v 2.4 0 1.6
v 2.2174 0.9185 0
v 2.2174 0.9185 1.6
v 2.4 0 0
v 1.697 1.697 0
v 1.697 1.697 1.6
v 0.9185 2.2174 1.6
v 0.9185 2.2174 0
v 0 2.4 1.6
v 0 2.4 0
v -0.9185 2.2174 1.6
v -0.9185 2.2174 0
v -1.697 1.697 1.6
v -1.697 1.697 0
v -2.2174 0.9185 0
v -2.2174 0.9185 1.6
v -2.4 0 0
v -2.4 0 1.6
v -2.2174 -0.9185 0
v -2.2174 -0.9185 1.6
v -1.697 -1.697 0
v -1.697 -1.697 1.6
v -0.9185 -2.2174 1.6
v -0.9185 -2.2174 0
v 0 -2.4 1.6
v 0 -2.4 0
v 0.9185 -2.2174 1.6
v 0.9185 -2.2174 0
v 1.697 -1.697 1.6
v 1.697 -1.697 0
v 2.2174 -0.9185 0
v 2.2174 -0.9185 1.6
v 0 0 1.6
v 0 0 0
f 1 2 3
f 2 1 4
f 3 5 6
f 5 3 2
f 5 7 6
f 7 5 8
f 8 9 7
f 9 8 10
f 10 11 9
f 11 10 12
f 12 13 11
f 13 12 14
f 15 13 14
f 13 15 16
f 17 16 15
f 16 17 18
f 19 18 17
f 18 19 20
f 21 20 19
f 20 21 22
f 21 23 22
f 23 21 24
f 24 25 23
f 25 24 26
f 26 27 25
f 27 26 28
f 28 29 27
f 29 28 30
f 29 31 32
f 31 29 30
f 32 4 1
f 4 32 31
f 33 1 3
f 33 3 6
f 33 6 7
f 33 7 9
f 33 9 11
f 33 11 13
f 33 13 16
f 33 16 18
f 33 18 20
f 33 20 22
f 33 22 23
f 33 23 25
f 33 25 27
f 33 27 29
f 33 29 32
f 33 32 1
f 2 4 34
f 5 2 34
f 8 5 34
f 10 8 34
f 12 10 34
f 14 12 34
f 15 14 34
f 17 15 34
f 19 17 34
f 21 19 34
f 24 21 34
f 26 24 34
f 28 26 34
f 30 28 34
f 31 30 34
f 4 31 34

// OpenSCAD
// file: 4-4edge.scad
use <../lib.scad>
function ldraw_lib__4_4edge() = [
// 0 Circle 1.0
// 0 Name: 4-4edge.dat
// 0 Author: James Jessiman
// 0 !LDRAW_ORG Primitive UPDATE 2017-01
// 0 !LICENSE Licensed under CC BY 4.0 : see CAreadme.txt
// 
// 0 BFC CERTIFY CCW
  [0,"BFC","CERTIFY"],
  [0,"BFC","CCW"],
// 
// 0 !HISTORY 1998-12-15 [PTadmin] Official Update 1998-10
// 0 !HISTORY 2005-12-28 [PTadmin] Official Update 2005-01
// 0 !HISTORY 2007-06-24 [PTadmin] Header formatted for Contributor Agreement
// 0 !HISTORY 2008-07-01 [PTadmin] Official Update 2008-01
// 0 !HISTORY 2017-01-15 [Steffen] BFCed
// 0 !HISTORY 2017-12-30 [PTadmin] Official Update 2017-01
// 
// 
// 2 24 1 0 0 0.9239 0 0.3827
  [2,24,1,0,0,0.9239,0,0.3827],
// 2 24 0.9239 0 0.3827 0.7071 0 0.7071
  [2,24,0.9239,0,0.3827,0.7071,0,0.7071],
// 2 24 0.7071 0 0.7071 0.3827 0 0.9239
  [2,24,0.7071,0,0.7071,0.3827,0,0.9239],
// 2 24 0.3827 0 0.9239 0 0 1
  [2,24,0.3827,0,0.9239,0,0,1],
// 2 24 0 0 1 -0.3827 0 0.9239
  [2,24,0,0,1,-0.3827,0,0.9239],
// 2 24 -0.3827 0 0.9239 -0.7071 0 0.7071
  [2,24,-0.3827,0,0.9239,-0.7071,0,0.7071],
// 2 24 -0.7071 0 0.7071 -0.9239 0 0.3827
  [2,24,-0.7071,0,0.7071,-0.9239,0,0.3827],
// 2 24 -0.9239 0 0.3827 -1 0 -0
  [2,24,-0.9239,0,0.3827,-1,0,-0],
// 2 24 -1 0 -0 -0.9239 0 -0.3827
  [2,24,-1,0,-0,-0.9239,0,-0.3827],
// 2 24 -0.9239 0 -0.3827 -0.7071 0 -0.7071
  [2,24,-0.9239,0,-0.3827,-0.7071,0,-0.7071],
// 2 24 -0.7071 0 -0.7071 -0.3827 0 -0.9239
  [2,24,-0.7071,0,-0.7071,-0.3827,0,-0.9239],
// 2 24 -0.3827 0 -0.9239 0 0 -1
  [2,24,-0.3827,0,-0.9239,0,0,-1],
// 2 24 0 0 -1 0.3827 0 -0.9239
  [2,24,0,0,-1,0.3827,0,-0.9239],
// 2 24 0.3827 0 -0.9239 0.7071 0 -0.7071
  [2,24,0.3827,0,-0.9239,0.7071,0,-0.7071],
// 2 24 0.7071 0 -0.7071 0.9239 0 -0.3827
  [2,24,0.7071,0,-0.7071,0.9239,0,-0.3827],
// 2 24 0.9239 0 -0.3827 1 0 0
  [2,24,0.9239,0,-0.3827,1,0,0],
];
module ldraw_lib__4_4edge(step=0, col=false, unit=2/5, alt=false, line=0.2, solid=!$preview)
    makepoly(ldraw_lib__4_4edge(), step=step, col=col, unit=unit, alt=alt, line=line, solid=solid);
ldraw_lib__4_4edge(line=0.2);
// file: 4-4disc.scad
use <../lib.scad>
function ldraw_lib__4_4disc() = [
// 0 Disc 1.0
// 0 Name: 4-4disc.dat
// 0 Author: James Jessiman
// 0 !LDRAW_ORG Primitive UPDATE 2002-02
// 0 !LICENSE Licensed under CC BY 4.0 : see CAreadme.txt
// 
// 0 BFC CERTIFY CCW
  [0,"BFC","CERTIFY"],
  [0,"BFC","CCW"],
// 
// 0 !HISTORY 1998-12-15 [PTadmin] Official Update 1998-10
// 0 !HISTORY 2002-03-23 [sbliss] Added BFC statement
// 0 !HISTORY 2002-04-25 [PTadmin] Official Update 2002-02
// 0 !HISTORY 2007-06-24 [PTadmin] Header formatted for Contributor Agreement
// 0 !HISTORY 2008-07-01 [PTadmin] Official Update 2008-01
// 
// 
// 3 16 0 0 0 1 0 0 0.9239 0 0.3827
  [3,16,0,0,0,1,0,0,0.9239,0,0.3827],
// 3 16 0 0 0 0.9239 0 0.3827 0.7071 0 0.7071
  [3,16,0,0,0,0.9239,0,0.3827,0.7071,0,0.7071],
// 3 16 0 0 0 0.7071 0 0.7071 0.3827 0 0.9239
  [3,16,0,0,0,0.7071,0,0.7071,0.3827,0,0.9239],
// 3 16 0 0 0 0.3827 0 0.9239 0 0 1
  [3,16,0,0,0,0.3827,0,0.9239,0,0,1],
// 3 16 0 0 0 0 0 1 -0.3827 0 0.9239
  [3,16,0,0,0,0,0,1,-0.3827,0,0.9239],
// 3 16 0 0 0 -0.3827 0 0.9239 -0.7071 0 0.7071
  [3,16,0,0,0,-0.3827,0,0.9239,-0.7071,0,0.7071],
// 3 16 0 0 0 -0.7071 0 0.7071 -0.9239 0 0.3827
  [3,16,0,0,0,-0.7071,0,0.7071,-0.9239,0,0.3827],
// 3 16 0 0 0 -0.9239 0 0.3827 -1 0 -0
  [3,16,0,0,0,-0.9239,0,0.3827,-1,0,-0],
// 3 16 0 0 0 -1 0 -0 -0.9239 0 -0.3827
  [3,16,0,0,0,-1,0,-0,-0.9239,0,-0.3827],
// 3 16 0 0 0 -0.9239 0 -0.3827 -0.7071 0 -0.7071
  [3,16,0,0,0,-0.9239,0,-0.3827,-0.7071,0,-0.7071],
// 3 16 0 0 0 -0.7071 0 -0.7071 -0.3827 0 -0.9239
  [3,16,0,0,0,-0.7071,0,-0.7071,-0.3827,0,-0.9239],
// 3 16 0 0 0 -0.3827 0 -0.9239 0 0 -1
  [3,16,0,0,0,-0.3827,0,-0.9239,0,0,-1],
// 3 16 0 0 0 0 0 -1 0.3827 0 -0.9239
  [3,16,0,0,0,0,0,-1,0.3827,0,-0.9239],
// 3 16 0 0 0 0.3827 0 -0.9239 0.7071 0 -0.7071
  [3,16,0,0,0,0.3827,0,-0.9239,0.7071,0,-0.7071],
// 3 16 0 0 0 0.7071 0 -0.7071 0.9239 0 -0.3827
  [3,16,0,0,0,0.7071,0,-0.7071,0.9239,0,-0.3827],
// 3 16 0 0 0 0.9239 0 -0.3827 1 0 0
  [3,16,0,0,0,0.9239,0,-0.3827,1,0,0],
// 0
];
module ldraw_lib__4_4disc(step=0, col=false, unit=2/5, alt=false, line=0.2, solid=!$preview)
    makepoly(ldraw_lib__4_4disc(), step=step, col=col, unit=unit, alt=alt, line=line, solid=solid);
ldraw_lib__4_4disc(line=0.2);
// file: 4-4cyli.scad
use <../lib.scad>
function ldraw_lib__4_4cyli() = [
// 0 Cylinder 1.0
// 0 Name: 4-4cyli.dat
// 0 Author: James Jessiman
// 0 !LDRAW_ORG Primitive UPDATE 2005-01
// 0 !LICENSE Licensed under CC BY 4.0 : see CAreadme.txt
// 
// 0 BFC CERTIFY CCW
  [0,"BFC","CERTIFY"],
  [0,"BFC","CCW"],
// 
// 0 !HISTORY 1998-12-15 [PTadmin] Official Update 1998-10
// 0 !HISTORY 2002-03-23 [sbliss] Added BFC statement; merged headers from files in distributions LDraw 0.27 and Complete.
// 0 !HISTORY 2002-04-25 [PTadmin] Official Update 2002-02
// 0 !HISTORY 2004-12-14 [guyvivan] BFC CCW
// 0 !HISTORY 2005-12-28 [PTadmin] Official Update 2005-01
// 0 !HISTORY 2007-06-24 [PTadmin] Header formatted for Contributor Agreement
// 0 !HISTORY 2008-07-01 [PTadmin] Official Update 2008-01
// 
// 
// 4 16 1 1 0 0.9239 1 0.3827 0.9239 0 0.3827 1 0 0
  [4,16,1,1,0,0.9239,1,0.3827,0.9239,0,0.3827,1,0,0],
// 5 24 1 0 0 1 1 0 0.9239 0 0.3827 0.9239 0 -0.3827
  [5,24,1,0,0,1,1,0,0.9239,0,0.3827,0.9239,0,-0.3827],
// 4 16 0.9239 1 0.3827 0.7071 1 0.7071 0.7071 0 0.7071 0.9239 0 0.3827
  [4,16,0.9239,1,0.3827,0.7071,1,0.7071,0.7071,0,0.7071,0.9239,0,0.3827],
// 5 24 0.9239 0 0.3827 0.9239 1 0.3827 0.7071 0 0.7071 1 0 0
  [5,24,0.9239,0,0.3827,0.9239,1,0.3827,0.7071,0,0.7071,1,0,0],
// 4 16 0.7071 1 0.7071 0.3827 1 0.9239 0.3827 0 0.9239 0.7071 0 0.7071
  [4,16,0.7071,1,0.7071,0.3827,1,0.9239,0.3827,0,0.9239,0.7071,0,0.7071],
// 5 24 0.7071 0 0.7071 0.7071 1 0.7071 0.3827 0 0.9239 0.9239 0 0.3827
  [5,24,0.7071,0,0.7071,0.7071,1,0.7071,0.3827,0,0.9239,0.9239,0,0.3827],
// 4 16 0.3827 1 0.9239 0 1 1 0 0 1 0.3827 0 0.9239
  [4,16,0.3827,1,0.9239,0,1,1,0,0,1,0.3827,0,0.9239],
// 5 24 0.3827 0 0.9239 0.3827 1 0.9239 0 0 1 0.7071 0 0.7071
  [5,24,0.3827,0,0.9239,0.3827,1,0.9239,0,0,1,0.7071,0,0.7071],
// 4 16 0 1 1 -0.3827 1 0.9239 -0.3827 0 0.9239 0 0 1
  [4,16,0,1,1,-0.3827,1,0.9239,-0.3827,0,0.9239,0,0,1],
// 5 24 0 0 1 0 1 1 -0.3827 0 0.9239 0.3827 0 0.9239
  [5,24,0,0,1,0,1,1,-0.3827,0,0.9239,0.3827,0,0.9239],
// 4 16 -0.3827 1 0.9239 -0.7071 1 0.7071 -0.7071 0 0.7071 -0.3827 0 0.9239
  [4,16,-0.3827,1,0.9239,-0.7071,1,0.7071,-0.7071,0,0.7071,-0.3827,0,0.9239],
// 5 24 -0.3827 0 0.9239 -0.3827 1 0.9239 -0.7071 0 0.7071 0 0 1
  [5,24,-0.3827,0,0.9239,-0.3827,1,0.9239,-0.7071,0,0.7071,0,0,1],
// 4 16 -0.7071 1 0.7071 -0.9239 1 0.3827 -0.9239 0 0.3827 -0.7071 0 0.7071
  [4,16,-0.7071,1,0.7071,-0.9239,1,0.3827,-0.9239,0,0.3827,-0.7071,0,0.7071],
// 5 24 -0.7071 0 0.7071 -0.7071 1 0.7071 -0.9239 0 0.3827 -0.3827 0 0.9239
  [5,24,-0.7071,0,0.7071,-0.7071,1,0.7071,-0.9239,0,0.3827,-0.3827,0,0.9239],
// 4 16 -0.9239 1 0.3827 -1 1 0 -1 0 0 -0.9239 0 0.3827
  [4,16,-0.9239,1,0.3827,-1,1,0,-1,0,0,-0.9239,0,0.3827],
// 5 24 -0.9239 0 0.3827 -0.9239 1 0.3827 -1 0 0 -0.7071 0 0.7071
  [5,24,-0.9239,0,0.3827,-0.9239,1,0.3827,-1,0,0,-0.7071,0,0.7071],
// 4 16 -1 1 0 -0.9239 1 -0.3827 -0.9239 0 -0.3827 -1 0 0
  [4,16,-1,1,0,-0.9239,1,-0.3827,-0.9239,0,-0.3827,-1,0,0],
// 5 24 -1 0 0 -1 1 0 -0.9239 0 -0.3827 -0.9239 0 0.3827
  [5,24,-1,0,0,-1,1,0,-0.9239,0,-0.3827,-0.9239,0,0.3827],
// 4 16 -0.9239 1 -0.3827 -0.7071 1 -0.7071 -0.7071 0 -0.7071 -0.9239 0 -0.3827
  [4,16,-0.9239,1,-0.3827,-0.7071,1,-0.7071,-0.7071,0,-0.7071,-0.9239,0,-0.3827],
// 5 24 -0.9239 0 -0.3827 -0.9239 1 -0.3827 -0.7071 0 -0.7071 -1 0 0
  [5,24,-0.9239,0,-0.3827,-0.9239,1,-0.3827,-0.7071,0,-0.7071,-1,0,0],
// 4 16 -0.7071 1 -0.7071 -0.3827 1 -0.9239 -0.3827 0 -0.9239 -0.7071 0 -0.7071
  [4,16,-0.7071,1,-0.7071,-0.3827,1,-0.9239,-0.3827,0,-0.9239,-0.7071,0,-0.7071],
// 5 24 -0.7071 0 -0.7071 -0.7071 1 -0.7071 -0.3827 0 -0.9239 -0.9239 0 -0.3827
  [5,24,-0.7071,0,-0.7071,-0.7071,1,-0.7071,-0.3827,0,-0.9239,-0.9239,0,-0.3827],
// 4 16 -0.3827 1 -0.9239 0 1 -1 0 0 -1 -0.3827 0 -0.9239
  [4,16,-0.3827,1,-0.9239,0,1,-1,0,0,-1,-0.3827,0,-0.9239],
// 5 24 -0.3827 0 -0.9239 -0.3827 1 -0.9239 0 0 -1 -0.7071 0 -0.7071
  [5,24,-0.3827,0,-0.9239,-0.3827,1,-0.9239,0,0,-1,-0.7071,0,-0.7071],
// 4 16 0 1 -1 0.3827 1 -0.9239 0.3827 0 -0.9239 0 0 -1
  [4,16,0,1,-1,0.3827,1,-0.9239,0.3827,0,-0.9239,0,0,-1],
// 5 24 0 0 -1 0 1 -1 0.3827 0 -0.9239 -0.3827 0 -0.9239
  [5,24,0,0,-1,0,1,-1,0.3827,0,-0.9239,-0.3827,0,-0.9239],
// 4 16 0.3827 1 -0.9239 0.7071 1 -0.7071 0.7071 0 -0.7071 0.3827 0 -0.9239
  [4,16,0.3827,1,-0.9239,0.7071,1,-0.7071,0.7071,0,-0.7071,0.3827,0,-0.9239],
// 5 24 0.3827 0 -0.9239 0.3827 1 -0.9239 0.7071 0 -0.7071 0 0 -1
  [5,24,0.3827,0,-0.9239,0.3827,1,-0.9239,0.7071,0,-0.7071,0,0,-1],
// 4 16 0.7071 1 -0.7071 0.9239 1 -0.3827 0.9239 0 -0.3827 0.7071 0 -0.7071
  [4,16,0.7071,1,-0.7071,0.9239,1,-0.3827,0.9239,0,-0.3827,0.7071,0,-0.7071],
// 5 24 0.7071 0 -0.7071 0.7071 1 -0.7071 0.9239 0 -0.3827 0.3827 0 -0.9239
  [5,24,0.7071,0,-0.7071,0.7071,1,-0.7071,0.9239,0,-0.3827,0.3827,0,-0.9239],
// 4 16 0.9239 1 -0.3827 1 1 0 1 0 0 0.9239 0 -0.3827
  [4,16,0.9239,1,-0.3827,1,1,0,1,0,0,0.9239,0,-0.3827],
// 5 24 0.9239 0 -0.3827 0.9239 1 -0.3827 1 0 0 0.7071 0 -0.7071
  [5,24,0.9239,0,-0.3827,0.9239,1,-0.3827,1,0,0,0.7071,0,-0.7071],
// 0
];
module ldraw_lib__4_4cyli(step=0, col=false, unit=2/5, alt=false, line=0.2, solid=!$preview)
    makepoly(ldraw_lib__4_4cyli(), step=step, col=col, unit=unit, alt=alt, line=line, solid=solid);
ldraw_lib__4_4cyli(line=0.2);
// main file
use <../lib.scad>
use <4-4cyli.scad>
use <4-4disc.scad>
use <4-4edge.scad>
function ldraw_lib__stud() = [
// 0 Stud
// 0 Name: stud.dat
// 0 Author: James Jessiman
// 0 !LDRAW_ORG Primitive UPDATE 2012-01
// 0 !LICENSE Licensed under CC BY 4.0 : see CAreadme.txt
// 
// 0 BFC CERTIFY CCW
  [0,"BFC","CERTIFY"],
  [0,"BFC","CCW"],
// 
// 0 !HISTORY 2002-04-04 [sbliss] Modified for BFC compliance
// 0 !HISTORY 2002-04-25 [PTadmin] Official Update 2002-02
// 0 !HISTORY 2007-06-24 [PTadmin] Header formatted for Contributor Agreement
// 0 !HISTORY 2008-07-01 [PTadmin] Official Update 2008-01
// 0 !HISTORY 2012-02-16 [Philo] Changed to CCW
// 0 !HISTORY 2012-03-30 [PTadmin] Official Update 2012-01
// 
// 
// 1 16 0 0 0 6 0 0 0 1 0 0 0 6 4-4edge.dat
  [1,16,0,0,0,6,0,0,0,1,0,0,0,6, ldraw_lib__4_4edge()],
// 1 16 0 -4 0 6 0 0 0 1 0 0 0 6 4-4edge.dat
  [1,16,0,-4,0,6,0,0,0,1,0,0,0,6, ldraw_lib__4_4edge()],
// 1 16 0 0 0 6 0 0 0 -4 0 0 0 6 4-4cyli.dat
  [1,16,0,0,0,6,0,0,0,-4,0,0,0,6, ldraw_lib__4_4cyli()],
// 1 16 0 -4 0 6 0 0 0 1 0 0 0 6 4-4disc.dat
  [1,16,0,-4,0,6,0,0,0,1,0,0,0,6, ldraw_lib__4_4disc()],
  [-1,16,0,0,0,6,0,0,0,-1,0,0,0,6, ldraw_lib__4_4disc()],
];
module ldraw_lib__stud(step=0, col=false, unit=2/5, alt=false, line=0.2, solid=!$preview)
    makepoly(ldraw_lib__stud(), step=step, col=col, unit=unit, alt=alt, line=line, solid=solid);
ldraw_lib__stud(line=0.2);
